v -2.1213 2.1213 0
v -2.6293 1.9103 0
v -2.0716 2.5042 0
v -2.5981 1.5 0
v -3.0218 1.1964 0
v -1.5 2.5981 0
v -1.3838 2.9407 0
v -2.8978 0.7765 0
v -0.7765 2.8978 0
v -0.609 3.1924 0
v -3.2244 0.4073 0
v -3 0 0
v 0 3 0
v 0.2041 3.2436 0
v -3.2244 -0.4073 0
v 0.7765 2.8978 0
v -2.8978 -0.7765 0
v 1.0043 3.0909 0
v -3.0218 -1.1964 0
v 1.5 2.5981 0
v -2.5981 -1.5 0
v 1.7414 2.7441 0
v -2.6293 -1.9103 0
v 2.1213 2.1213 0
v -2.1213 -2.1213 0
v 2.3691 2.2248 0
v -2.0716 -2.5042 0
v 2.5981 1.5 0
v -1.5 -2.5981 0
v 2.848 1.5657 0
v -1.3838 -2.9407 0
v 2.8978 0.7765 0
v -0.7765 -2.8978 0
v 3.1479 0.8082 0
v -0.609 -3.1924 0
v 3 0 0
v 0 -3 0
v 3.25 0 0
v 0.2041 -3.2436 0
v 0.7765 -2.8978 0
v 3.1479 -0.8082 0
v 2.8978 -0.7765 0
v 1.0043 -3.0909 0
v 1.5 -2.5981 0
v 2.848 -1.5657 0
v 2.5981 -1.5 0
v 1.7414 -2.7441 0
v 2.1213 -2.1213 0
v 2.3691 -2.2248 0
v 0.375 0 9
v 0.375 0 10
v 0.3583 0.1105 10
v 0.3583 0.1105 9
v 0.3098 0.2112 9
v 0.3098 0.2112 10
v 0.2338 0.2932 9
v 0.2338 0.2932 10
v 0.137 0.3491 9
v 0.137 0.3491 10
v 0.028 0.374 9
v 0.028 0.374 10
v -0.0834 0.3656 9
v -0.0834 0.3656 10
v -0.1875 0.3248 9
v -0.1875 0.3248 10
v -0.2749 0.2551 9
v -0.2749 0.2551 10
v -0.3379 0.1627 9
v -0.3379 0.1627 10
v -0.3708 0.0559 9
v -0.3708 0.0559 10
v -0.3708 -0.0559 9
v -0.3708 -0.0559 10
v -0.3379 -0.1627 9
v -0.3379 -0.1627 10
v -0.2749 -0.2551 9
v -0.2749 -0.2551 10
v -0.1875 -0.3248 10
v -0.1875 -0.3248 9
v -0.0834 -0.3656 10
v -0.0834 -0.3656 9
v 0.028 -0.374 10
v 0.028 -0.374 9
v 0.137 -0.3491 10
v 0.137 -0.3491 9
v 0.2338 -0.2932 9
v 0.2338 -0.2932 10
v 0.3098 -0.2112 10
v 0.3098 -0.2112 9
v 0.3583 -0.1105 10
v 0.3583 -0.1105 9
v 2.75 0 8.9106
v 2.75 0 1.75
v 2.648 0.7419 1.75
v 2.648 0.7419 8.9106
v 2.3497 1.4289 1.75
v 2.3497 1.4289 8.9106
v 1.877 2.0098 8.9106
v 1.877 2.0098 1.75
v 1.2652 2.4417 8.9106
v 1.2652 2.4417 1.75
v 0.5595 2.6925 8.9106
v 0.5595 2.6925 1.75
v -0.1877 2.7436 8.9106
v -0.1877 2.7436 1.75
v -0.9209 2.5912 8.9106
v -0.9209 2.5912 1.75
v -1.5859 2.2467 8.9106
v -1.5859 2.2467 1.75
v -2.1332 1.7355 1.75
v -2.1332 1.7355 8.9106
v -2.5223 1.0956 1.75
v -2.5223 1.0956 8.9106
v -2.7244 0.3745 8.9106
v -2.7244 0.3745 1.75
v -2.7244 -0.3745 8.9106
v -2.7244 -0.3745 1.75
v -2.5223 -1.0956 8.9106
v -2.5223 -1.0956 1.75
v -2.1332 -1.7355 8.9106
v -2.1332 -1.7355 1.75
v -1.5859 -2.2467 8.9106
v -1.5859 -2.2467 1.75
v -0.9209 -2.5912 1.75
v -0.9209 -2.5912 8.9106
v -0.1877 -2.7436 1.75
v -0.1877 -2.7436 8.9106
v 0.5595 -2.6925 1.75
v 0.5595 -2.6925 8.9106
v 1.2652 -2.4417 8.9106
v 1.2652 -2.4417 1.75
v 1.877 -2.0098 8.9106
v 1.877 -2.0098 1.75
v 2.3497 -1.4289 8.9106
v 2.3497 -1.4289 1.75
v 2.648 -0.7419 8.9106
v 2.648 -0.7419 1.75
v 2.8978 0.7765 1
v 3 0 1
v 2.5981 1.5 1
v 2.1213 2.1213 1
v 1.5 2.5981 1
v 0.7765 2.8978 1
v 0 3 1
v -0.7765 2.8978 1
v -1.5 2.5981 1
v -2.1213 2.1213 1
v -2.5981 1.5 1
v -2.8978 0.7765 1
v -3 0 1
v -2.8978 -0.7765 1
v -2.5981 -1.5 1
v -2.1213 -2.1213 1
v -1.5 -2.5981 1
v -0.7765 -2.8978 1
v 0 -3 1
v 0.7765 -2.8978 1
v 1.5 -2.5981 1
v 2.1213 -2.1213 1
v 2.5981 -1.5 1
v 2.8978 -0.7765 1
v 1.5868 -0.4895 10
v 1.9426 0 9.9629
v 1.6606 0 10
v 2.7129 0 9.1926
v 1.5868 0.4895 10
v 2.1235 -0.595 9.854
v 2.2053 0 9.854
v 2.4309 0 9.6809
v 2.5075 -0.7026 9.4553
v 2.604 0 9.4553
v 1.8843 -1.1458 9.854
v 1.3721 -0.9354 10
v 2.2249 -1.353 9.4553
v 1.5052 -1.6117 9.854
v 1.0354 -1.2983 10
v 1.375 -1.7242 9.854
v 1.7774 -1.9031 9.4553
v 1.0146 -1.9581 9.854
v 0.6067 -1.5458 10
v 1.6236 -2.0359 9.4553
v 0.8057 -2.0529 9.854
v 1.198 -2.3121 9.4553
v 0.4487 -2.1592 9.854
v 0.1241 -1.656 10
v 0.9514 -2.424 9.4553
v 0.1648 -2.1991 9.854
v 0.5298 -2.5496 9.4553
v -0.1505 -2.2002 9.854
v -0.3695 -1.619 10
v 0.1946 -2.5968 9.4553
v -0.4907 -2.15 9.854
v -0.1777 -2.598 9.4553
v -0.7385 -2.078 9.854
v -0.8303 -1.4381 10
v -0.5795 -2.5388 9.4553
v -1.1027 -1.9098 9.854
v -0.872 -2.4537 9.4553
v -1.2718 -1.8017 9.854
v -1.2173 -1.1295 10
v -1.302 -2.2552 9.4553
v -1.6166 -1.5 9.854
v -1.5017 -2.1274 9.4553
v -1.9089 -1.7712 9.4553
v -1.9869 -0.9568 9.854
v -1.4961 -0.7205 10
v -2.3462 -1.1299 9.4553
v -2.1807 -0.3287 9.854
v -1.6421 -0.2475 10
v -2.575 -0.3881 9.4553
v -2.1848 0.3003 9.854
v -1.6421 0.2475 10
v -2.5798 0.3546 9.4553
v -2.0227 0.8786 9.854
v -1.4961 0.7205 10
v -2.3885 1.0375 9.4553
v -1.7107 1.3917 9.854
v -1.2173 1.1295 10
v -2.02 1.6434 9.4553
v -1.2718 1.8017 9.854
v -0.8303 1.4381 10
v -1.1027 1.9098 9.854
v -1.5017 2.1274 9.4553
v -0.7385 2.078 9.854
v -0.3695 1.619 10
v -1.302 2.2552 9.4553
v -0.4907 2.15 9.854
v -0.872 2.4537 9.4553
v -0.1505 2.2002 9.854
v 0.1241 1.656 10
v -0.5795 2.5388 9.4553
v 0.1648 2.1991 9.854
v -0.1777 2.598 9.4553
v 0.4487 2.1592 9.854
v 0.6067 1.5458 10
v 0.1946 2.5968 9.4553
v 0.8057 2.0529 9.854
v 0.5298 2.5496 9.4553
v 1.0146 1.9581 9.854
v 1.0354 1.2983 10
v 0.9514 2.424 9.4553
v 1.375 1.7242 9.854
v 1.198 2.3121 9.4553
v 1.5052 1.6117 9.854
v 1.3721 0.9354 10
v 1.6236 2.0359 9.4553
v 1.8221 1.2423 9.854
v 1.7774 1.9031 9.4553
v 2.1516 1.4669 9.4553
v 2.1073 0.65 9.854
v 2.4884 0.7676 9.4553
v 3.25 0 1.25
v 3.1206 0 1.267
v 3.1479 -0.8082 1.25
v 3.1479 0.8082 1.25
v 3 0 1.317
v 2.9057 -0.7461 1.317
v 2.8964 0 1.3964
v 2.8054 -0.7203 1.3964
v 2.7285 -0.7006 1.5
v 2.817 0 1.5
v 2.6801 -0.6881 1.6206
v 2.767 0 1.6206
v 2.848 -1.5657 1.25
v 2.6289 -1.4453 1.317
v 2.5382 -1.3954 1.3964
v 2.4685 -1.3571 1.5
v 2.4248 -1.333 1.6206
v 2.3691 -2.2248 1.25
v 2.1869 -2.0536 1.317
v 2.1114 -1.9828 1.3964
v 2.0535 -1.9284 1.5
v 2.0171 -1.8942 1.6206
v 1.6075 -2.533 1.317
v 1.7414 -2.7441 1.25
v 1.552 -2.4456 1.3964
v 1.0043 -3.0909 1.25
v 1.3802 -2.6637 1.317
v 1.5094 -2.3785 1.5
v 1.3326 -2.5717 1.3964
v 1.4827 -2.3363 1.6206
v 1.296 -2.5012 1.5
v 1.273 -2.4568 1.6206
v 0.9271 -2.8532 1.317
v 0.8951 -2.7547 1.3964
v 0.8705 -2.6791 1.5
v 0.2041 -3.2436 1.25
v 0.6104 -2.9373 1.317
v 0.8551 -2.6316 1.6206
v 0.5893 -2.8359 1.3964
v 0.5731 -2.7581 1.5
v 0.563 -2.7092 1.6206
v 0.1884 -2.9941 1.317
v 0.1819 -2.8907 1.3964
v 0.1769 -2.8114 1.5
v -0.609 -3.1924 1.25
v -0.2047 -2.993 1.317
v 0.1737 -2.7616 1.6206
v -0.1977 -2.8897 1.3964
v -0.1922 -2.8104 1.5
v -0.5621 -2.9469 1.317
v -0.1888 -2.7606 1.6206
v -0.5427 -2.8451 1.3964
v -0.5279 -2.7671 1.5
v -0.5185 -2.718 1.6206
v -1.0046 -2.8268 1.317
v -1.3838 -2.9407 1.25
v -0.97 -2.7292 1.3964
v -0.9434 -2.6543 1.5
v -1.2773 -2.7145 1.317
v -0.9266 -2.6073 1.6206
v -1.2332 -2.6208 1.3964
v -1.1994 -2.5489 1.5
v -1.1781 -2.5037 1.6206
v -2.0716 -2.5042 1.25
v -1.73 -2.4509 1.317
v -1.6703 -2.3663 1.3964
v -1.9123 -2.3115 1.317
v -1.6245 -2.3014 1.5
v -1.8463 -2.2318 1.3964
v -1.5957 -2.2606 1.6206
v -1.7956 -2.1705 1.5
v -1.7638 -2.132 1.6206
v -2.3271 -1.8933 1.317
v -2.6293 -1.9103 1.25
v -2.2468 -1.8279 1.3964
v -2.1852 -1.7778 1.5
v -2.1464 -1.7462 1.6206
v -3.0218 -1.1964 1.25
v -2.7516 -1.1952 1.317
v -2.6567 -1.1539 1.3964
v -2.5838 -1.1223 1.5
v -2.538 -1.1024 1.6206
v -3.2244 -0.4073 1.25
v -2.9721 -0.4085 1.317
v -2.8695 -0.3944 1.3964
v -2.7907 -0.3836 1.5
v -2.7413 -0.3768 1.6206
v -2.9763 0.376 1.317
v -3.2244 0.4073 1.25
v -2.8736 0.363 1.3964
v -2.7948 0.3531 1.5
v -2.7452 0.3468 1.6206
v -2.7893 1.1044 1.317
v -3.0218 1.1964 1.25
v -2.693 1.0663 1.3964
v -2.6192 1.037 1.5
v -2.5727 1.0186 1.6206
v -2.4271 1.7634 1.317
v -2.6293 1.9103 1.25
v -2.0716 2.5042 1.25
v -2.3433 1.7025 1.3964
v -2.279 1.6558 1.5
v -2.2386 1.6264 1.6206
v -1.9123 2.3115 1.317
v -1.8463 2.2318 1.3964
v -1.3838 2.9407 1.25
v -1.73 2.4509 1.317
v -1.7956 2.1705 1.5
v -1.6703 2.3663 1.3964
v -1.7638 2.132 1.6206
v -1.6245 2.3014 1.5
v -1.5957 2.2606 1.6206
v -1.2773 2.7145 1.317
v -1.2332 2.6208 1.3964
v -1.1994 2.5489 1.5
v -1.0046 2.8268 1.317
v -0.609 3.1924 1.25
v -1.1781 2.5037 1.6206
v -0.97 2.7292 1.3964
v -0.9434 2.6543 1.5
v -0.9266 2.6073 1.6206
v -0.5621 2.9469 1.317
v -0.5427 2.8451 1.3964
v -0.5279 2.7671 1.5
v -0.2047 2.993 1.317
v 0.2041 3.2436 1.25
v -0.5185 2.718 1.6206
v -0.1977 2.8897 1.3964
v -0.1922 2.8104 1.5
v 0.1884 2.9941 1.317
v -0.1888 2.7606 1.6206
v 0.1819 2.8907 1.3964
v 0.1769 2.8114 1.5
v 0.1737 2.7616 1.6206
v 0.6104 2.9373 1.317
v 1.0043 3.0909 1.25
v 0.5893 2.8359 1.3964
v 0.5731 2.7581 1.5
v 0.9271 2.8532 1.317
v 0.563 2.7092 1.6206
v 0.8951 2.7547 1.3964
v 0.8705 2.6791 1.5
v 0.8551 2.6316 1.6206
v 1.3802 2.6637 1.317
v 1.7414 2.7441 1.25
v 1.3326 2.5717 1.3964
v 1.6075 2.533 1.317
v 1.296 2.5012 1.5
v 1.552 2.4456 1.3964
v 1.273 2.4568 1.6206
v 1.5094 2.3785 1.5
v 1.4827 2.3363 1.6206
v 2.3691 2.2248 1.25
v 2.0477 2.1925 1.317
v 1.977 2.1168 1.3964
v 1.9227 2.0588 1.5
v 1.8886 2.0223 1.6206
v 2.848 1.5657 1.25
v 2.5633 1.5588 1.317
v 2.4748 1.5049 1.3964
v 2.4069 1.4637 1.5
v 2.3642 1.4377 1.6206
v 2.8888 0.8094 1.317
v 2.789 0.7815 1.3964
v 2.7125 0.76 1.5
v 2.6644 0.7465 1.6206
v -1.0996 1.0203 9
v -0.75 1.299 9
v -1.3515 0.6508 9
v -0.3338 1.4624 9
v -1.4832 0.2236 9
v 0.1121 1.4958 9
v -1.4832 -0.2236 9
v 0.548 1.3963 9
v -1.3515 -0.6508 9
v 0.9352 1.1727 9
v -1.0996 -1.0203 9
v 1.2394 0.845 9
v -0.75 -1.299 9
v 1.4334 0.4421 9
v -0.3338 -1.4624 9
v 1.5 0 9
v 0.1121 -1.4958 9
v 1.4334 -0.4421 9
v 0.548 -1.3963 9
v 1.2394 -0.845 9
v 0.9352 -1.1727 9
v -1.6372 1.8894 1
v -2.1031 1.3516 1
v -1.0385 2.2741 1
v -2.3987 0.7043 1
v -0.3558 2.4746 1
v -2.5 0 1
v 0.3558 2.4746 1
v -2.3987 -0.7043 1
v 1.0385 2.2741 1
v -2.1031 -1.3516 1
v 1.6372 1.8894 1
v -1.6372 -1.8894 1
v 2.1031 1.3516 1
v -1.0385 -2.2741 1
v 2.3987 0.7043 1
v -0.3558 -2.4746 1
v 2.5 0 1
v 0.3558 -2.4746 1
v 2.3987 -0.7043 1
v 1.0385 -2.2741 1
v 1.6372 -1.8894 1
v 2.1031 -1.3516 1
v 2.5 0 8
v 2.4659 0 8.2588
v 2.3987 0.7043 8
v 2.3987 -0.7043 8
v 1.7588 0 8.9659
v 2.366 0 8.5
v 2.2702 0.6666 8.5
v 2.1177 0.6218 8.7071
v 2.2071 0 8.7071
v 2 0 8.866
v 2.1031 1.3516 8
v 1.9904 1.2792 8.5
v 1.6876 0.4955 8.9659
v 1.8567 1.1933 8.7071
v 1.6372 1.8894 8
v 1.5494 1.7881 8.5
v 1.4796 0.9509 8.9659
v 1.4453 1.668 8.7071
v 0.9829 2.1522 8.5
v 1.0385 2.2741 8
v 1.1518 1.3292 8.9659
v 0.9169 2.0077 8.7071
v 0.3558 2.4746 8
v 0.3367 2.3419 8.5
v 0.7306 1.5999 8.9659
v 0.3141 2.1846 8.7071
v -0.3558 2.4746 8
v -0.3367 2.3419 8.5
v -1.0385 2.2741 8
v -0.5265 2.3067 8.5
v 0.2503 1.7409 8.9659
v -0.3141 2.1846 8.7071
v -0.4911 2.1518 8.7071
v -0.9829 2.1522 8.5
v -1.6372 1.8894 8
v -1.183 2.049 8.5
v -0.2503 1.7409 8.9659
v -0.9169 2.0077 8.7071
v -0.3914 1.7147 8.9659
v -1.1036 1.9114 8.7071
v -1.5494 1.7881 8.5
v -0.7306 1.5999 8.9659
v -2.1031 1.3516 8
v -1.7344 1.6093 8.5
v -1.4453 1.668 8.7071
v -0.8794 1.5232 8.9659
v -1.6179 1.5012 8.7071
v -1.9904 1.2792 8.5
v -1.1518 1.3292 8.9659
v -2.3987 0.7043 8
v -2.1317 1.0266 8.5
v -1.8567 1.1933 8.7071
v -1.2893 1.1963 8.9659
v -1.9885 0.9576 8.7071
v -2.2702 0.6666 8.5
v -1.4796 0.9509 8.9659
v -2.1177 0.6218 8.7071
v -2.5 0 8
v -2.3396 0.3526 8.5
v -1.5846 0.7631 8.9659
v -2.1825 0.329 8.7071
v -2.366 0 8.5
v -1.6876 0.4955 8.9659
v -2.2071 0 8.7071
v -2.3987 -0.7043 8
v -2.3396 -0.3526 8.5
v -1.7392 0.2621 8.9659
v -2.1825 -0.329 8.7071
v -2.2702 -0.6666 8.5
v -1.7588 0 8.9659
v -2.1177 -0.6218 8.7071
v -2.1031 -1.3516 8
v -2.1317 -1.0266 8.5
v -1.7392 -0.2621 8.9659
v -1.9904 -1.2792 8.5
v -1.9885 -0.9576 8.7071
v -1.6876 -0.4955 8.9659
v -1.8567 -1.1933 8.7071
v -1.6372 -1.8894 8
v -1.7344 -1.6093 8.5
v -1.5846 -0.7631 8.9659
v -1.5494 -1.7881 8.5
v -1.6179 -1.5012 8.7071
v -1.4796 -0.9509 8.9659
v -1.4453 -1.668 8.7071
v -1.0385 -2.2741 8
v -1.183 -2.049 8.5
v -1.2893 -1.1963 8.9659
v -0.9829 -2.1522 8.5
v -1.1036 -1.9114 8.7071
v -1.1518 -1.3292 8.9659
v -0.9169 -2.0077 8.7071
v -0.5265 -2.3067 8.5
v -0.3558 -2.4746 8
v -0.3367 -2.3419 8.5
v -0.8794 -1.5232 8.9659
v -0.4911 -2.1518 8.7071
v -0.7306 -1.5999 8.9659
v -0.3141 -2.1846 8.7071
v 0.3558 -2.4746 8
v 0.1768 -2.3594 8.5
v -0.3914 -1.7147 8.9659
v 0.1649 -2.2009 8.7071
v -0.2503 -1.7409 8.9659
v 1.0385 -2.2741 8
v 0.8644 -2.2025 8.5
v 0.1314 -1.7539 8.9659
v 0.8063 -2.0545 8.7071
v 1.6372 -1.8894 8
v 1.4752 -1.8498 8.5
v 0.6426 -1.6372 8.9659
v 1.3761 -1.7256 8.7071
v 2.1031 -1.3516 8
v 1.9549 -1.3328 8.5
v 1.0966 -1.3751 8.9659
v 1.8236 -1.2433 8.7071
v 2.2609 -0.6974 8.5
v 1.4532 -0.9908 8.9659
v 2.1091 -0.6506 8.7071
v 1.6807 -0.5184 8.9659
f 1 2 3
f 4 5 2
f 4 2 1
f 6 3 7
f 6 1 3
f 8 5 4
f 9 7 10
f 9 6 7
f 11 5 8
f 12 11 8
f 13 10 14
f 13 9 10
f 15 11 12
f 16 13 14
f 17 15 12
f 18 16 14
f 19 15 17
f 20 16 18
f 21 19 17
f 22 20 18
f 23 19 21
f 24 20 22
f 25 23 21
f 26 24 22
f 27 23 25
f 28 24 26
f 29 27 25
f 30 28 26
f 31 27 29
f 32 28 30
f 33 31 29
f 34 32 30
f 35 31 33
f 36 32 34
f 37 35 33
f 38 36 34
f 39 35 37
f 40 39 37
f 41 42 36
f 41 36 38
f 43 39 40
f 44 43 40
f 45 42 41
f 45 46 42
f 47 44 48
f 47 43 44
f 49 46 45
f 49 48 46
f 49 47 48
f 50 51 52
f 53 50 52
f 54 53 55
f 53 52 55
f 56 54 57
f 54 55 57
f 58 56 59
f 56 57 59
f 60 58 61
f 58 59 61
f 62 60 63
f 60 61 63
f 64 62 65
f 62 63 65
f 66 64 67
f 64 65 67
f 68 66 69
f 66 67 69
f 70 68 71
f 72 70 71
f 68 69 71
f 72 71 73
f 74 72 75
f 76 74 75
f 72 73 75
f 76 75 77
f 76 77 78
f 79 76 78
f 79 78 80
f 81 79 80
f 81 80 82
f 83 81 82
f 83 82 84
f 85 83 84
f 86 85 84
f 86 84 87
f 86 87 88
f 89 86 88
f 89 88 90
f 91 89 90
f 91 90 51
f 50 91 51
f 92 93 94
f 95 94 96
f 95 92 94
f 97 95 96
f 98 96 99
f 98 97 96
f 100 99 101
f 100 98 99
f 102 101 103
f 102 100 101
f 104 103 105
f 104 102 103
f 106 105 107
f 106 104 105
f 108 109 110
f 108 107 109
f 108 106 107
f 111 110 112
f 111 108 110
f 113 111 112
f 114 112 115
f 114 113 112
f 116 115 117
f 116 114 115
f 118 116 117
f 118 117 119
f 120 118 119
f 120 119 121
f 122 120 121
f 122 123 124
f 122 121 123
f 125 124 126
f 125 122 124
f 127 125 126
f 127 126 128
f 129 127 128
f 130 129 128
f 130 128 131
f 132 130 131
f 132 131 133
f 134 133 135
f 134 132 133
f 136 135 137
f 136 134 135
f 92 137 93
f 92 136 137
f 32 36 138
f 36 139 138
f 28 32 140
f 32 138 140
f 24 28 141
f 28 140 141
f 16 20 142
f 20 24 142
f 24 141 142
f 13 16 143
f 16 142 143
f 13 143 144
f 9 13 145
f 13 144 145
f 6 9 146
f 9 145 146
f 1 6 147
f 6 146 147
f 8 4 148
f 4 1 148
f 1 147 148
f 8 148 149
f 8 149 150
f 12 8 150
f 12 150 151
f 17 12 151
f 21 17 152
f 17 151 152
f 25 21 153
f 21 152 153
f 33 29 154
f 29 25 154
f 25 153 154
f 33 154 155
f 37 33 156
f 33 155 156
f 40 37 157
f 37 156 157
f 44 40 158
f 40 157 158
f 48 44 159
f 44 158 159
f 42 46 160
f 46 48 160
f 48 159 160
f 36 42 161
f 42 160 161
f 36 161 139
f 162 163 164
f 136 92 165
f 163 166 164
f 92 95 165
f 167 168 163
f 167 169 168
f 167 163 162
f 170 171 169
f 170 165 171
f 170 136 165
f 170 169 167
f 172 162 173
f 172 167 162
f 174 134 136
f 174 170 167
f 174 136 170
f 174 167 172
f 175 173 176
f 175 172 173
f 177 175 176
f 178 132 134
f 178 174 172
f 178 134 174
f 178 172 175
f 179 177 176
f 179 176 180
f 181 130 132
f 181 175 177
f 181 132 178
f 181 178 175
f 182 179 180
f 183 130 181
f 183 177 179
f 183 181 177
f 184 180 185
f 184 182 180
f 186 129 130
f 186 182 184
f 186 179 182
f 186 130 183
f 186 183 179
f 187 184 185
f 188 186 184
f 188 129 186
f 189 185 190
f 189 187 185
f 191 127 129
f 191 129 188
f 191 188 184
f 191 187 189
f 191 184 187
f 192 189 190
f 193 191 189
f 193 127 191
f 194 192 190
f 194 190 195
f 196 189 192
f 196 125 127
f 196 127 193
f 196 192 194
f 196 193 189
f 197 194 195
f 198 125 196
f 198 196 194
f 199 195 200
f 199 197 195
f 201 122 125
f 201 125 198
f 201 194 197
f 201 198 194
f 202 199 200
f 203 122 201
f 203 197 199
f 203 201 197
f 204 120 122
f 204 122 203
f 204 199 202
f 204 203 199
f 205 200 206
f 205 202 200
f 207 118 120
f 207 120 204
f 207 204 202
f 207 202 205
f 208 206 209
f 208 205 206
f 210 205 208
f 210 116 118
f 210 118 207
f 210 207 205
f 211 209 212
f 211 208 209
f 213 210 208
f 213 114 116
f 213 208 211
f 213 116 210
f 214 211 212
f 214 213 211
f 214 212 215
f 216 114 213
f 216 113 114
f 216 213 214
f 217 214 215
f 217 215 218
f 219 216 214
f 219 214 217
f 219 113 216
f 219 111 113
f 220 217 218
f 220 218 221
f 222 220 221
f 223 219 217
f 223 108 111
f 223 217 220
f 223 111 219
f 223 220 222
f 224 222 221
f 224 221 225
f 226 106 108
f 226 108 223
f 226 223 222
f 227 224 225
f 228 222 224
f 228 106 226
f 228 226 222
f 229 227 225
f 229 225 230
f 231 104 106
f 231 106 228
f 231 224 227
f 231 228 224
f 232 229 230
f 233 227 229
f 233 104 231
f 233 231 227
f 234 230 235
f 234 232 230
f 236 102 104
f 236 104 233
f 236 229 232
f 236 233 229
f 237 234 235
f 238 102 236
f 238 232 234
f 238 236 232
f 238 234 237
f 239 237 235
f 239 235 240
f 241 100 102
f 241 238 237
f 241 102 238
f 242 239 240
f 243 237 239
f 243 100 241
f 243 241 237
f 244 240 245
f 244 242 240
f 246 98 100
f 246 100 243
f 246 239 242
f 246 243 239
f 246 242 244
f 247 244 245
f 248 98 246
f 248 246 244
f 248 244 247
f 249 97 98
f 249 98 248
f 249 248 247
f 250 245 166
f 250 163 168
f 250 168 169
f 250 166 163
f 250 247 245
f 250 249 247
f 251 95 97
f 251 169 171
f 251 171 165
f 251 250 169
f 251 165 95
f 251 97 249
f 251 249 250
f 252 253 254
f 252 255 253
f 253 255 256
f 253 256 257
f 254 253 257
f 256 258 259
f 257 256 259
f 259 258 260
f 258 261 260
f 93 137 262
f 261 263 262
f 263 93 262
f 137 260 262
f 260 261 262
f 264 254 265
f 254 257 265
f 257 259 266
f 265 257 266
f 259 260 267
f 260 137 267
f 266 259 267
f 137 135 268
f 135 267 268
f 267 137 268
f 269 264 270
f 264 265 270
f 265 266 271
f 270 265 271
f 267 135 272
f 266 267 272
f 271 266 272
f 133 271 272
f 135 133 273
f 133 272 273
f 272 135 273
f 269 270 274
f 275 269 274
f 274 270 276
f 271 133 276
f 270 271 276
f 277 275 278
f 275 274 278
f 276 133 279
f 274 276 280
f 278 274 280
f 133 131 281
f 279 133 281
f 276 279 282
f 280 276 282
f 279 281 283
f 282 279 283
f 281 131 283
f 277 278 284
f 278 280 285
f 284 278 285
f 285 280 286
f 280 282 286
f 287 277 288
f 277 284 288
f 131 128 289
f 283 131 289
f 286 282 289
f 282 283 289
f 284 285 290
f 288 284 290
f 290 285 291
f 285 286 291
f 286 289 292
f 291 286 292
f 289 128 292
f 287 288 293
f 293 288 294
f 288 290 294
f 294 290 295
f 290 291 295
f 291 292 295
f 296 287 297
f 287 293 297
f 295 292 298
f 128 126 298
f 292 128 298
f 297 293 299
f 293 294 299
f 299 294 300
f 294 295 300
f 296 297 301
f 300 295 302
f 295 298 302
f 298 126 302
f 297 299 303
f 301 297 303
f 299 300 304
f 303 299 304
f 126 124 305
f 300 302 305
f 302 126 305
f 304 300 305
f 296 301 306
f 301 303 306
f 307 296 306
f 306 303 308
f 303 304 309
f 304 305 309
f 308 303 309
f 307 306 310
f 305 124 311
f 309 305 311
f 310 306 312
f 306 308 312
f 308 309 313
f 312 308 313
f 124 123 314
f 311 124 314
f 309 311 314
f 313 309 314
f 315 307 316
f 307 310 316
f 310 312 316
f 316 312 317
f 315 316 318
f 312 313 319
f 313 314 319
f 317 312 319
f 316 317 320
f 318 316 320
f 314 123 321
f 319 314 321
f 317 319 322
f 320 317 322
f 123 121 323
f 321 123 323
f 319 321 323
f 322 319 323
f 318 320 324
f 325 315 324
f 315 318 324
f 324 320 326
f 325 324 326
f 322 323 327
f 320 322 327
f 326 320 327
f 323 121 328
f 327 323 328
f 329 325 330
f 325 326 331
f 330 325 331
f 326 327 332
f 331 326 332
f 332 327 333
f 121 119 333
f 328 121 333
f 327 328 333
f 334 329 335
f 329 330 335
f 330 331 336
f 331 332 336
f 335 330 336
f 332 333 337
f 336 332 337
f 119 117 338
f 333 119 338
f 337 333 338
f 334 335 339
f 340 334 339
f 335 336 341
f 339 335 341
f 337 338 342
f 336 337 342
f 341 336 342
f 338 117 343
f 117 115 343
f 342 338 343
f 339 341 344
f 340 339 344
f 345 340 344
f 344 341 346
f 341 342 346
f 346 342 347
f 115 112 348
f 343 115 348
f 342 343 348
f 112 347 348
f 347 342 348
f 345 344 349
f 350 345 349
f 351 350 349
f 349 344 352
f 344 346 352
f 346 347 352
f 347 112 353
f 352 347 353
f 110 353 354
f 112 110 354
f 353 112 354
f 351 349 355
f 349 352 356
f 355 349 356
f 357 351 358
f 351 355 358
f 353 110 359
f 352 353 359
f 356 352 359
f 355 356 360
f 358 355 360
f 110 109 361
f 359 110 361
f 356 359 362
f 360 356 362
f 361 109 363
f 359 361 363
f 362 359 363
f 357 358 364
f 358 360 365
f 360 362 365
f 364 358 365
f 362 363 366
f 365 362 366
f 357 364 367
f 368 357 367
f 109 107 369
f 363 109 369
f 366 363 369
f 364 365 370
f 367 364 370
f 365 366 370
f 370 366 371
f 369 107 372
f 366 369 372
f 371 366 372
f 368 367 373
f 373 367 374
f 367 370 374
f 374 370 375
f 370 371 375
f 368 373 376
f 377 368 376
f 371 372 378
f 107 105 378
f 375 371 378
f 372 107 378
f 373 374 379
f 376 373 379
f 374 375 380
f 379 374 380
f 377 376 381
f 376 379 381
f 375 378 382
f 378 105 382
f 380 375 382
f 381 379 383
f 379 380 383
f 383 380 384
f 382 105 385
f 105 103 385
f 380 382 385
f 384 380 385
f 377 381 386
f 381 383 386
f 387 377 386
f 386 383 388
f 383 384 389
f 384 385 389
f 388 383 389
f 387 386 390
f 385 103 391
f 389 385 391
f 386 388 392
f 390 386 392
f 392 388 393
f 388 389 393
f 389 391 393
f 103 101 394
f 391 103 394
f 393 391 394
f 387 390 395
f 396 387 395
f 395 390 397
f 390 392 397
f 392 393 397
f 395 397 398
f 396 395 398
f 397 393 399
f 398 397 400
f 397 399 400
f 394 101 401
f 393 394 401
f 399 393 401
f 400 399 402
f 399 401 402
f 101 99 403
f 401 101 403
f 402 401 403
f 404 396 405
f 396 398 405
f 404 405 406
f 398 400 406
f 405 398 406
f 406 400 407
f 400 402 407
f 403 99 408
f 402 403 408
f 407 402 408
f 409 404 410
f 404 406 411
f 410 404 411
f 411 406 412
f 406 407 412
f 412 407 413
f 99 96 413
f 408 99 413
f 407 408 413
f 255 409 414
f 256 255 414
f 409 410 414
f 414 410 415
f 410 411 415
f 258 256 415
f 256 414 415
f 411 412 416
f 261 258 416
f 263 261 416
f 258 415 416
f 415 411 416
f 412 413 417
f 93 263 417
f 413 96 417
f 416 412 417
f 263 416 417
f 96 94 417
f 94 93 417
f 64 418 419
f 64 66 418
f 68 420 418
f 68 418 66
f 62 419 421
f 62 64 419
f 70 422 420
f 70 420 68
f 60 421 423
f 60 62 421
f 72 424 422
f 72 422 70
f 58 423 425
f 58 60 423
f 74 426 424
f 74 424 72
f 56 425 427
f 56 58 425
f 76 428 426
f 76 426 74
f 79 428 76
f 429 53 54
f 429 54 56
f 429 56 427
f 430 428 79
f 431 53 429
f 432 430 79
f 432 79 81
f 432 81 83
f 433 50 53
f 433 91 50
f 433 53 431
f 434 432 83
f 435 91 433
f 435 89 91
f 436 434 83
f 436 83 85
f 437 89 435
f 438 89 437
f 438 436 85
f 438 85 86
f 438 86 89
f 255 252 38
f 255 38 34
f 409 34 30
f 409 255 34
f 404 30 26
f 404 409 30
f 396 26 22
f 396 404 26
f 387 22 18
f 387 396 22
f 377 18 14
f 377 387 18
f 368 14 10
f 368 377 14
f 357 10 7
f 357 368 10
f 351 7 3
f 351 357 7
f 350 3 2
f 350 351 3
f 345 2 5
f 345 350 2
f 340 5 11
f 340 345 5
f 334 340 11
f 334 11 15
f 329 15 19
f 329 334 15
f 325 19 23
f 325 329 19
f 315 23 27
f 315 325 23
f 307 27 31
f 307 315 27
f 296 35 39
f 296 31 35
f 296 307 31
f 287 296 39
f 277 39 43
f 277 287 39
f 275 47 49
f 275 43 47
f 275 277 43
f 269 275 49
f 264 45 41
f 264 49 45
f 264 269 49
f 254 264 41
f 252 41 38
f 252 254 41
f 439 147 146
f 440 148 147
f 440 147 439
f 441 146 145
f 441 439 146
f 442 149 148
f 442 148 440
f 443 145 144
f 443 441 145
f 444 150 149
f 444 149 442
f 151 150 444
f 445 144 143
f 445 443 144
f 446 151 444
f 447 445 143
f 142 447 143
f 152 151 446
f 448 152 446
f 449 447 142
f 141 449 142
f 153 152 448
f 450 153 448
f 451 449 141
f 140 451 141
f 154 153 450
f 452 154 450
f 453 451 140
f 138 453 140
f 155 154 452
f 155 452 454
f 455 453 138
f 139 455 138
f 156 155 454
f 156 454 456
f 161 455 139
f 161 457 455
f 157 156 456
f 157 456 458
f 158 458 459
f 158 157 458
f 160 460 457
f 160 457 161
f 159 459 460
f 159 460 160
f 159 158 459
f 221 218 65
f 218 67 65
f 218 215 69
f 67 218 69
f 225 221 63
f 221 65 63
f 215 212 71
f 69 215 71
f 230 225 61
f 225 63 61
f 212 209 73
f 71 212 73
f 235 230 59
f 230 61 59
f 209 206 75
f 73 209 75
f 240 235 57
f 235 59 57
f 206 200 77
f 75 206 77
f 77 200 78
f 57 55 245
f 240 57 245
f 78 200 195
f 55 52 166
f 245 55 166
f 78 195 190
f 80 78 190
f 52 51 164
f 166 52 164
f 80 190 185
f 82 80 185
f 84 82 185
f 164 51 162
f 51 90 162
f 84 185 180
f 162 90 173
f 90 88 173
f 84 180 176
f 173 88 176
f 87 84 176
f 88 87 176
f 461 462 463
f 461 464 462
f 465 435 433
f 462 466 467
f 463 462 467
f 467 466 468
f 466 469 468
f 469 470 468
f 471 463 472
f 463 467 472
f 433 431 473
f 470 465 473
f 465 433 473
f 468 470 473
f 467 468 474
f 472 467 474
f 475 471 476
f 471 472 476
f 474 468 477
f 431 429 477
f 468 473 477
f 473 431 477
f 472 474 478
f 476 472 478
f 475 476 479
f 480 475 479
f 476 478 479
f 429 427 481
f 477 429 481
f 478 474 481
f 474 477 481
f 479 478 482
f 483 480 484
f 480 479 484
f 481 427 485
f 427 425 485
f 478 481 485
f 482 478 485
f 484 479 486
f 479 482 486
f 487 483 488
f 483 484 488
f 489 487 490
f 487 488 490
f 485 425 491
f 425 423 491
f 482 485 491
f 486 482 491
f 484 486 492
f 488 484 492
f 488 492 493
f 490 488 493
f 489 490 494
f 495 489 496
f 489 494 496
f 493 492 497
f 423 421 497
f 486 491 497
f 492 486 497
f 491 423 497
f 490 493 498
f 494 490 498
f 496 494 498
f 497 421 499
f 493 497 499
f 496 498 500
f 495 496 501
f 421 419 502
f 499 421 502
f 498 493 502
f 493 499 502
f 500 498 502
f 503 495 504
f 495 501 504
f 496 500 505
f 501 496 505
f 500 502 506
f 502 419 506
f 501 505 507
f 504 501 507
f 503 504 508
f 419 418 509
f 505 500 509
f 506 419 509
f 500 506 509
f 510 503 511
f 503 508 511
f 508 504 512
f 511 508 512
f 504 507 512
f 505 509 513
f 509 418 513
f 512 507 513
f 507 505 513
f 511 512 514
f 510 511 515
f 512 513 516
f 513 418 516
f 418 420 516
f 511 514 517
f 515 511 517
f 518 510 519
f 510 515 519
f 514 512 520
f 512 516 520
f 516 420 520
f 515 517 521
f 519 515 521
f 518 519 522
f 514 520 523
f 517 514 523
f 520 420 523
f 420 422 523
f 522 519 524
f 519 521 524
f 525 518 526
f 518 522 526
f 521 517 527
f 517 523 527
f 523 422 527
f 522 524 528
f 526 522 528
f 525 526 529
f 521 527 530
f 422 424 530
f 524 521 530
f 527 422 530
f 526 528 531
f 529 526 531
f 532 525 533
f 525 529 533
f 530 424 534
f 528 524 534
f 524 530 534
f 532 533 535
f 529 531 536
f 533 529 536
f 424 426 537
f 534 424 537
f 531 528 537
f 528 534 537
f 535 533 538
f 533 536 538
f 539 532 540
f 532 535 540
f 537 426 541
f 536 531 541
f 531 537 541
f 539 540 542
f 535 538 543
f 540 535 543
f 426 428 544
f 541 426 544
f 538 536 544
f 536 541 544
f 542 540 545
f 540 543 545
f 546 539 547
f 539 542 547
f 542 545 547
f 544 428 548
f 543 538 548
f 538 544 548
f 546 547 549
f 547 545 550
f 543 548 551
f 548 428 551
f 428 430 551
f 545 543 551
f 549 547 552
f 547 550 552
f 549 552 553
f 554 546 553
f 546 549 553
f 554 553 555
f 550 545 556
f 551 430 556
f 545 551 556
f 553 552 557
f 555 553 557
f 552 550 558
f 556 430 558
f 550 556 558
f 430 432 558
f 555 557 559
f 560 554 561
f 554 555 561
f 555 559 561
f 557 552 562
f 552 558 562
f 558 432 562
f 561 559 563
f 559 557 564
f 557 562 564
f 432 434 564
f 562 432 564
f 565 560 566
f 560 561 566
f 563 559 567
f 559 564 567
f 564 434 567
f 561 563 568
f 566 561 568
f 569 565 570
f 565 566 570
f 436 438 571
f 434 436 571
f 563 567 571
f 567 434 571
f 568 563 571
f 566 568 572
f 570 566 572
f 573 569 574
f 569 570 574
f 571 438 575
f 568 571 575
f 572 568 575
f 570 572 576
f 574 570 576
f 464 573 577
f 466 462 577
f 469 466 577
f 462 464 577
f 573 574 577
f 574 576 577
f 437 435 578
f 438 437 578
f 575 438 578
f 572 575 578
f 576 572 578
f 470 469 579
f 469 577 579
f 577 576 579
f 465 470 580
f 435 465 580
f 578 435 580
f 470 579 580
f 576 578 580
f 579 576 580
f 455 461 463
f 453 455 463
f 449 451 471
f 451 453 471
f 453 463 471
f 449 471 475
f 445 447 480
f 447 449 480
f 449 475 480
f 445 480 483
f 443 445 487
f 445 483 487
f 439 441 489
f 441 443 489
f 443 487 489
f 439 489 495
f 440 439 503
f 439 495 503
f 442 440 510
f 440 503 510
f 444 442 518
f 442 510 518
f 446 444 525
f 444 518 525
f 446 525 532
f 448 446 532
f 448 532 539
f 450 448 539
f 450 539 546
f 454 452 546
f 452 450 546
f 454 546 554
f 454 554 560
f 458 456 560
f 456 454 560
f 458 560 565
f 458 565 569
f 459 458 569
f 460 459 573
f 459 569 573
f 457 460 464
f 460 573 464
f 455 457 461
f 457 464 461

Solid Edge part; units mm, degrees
sketch "Sketch1" plane through (0, 0, 0) normal (0, -1, 0) x (1, 0, 0)
  line L0 (3.25, 0) -> (3.25, 1.25)
  arc A0 (3.25, 1.25) -> (2.75, 1.75) centre (3.25, 1.75) cw
  line L1 (2.75, 1.75) -> (2.75, 8.9106)
  arc A1 (1.6606, 10) -> (2.75, 8.9106) centre (1.6606, 8.9106) cw
  line L2 (1.6606, 10) -> (0, 10)
  line L3 (0, 10) -> (0, 9)
  line L4 (2.5, 9) -> (0, 9)
  line L5 (2.5, 1) -> (2.5, 9)
  line L6 (3, 1) -> (2.5, 1)
  line L7 (3, 0) -> (3, 1)
  line L8 (3, 0) -> (3.25, 0)
revolve "RevolvedProtrusion1" add sketch "Sketch1" angle 360 about axis through (0, 0, 10) along (0, 0, -1)
sketch "Sketch2" plane through (0, 0, 10) normal (0, 0, 1) x (1, 0, 0)
  circle A0 centre (0, 0) radius 0.375
extrude "Cutout1" cut sketch "Sketch2" against normal through all
fillet "Round1" radius 1 1 edges at (-2.5, 0, 9)
